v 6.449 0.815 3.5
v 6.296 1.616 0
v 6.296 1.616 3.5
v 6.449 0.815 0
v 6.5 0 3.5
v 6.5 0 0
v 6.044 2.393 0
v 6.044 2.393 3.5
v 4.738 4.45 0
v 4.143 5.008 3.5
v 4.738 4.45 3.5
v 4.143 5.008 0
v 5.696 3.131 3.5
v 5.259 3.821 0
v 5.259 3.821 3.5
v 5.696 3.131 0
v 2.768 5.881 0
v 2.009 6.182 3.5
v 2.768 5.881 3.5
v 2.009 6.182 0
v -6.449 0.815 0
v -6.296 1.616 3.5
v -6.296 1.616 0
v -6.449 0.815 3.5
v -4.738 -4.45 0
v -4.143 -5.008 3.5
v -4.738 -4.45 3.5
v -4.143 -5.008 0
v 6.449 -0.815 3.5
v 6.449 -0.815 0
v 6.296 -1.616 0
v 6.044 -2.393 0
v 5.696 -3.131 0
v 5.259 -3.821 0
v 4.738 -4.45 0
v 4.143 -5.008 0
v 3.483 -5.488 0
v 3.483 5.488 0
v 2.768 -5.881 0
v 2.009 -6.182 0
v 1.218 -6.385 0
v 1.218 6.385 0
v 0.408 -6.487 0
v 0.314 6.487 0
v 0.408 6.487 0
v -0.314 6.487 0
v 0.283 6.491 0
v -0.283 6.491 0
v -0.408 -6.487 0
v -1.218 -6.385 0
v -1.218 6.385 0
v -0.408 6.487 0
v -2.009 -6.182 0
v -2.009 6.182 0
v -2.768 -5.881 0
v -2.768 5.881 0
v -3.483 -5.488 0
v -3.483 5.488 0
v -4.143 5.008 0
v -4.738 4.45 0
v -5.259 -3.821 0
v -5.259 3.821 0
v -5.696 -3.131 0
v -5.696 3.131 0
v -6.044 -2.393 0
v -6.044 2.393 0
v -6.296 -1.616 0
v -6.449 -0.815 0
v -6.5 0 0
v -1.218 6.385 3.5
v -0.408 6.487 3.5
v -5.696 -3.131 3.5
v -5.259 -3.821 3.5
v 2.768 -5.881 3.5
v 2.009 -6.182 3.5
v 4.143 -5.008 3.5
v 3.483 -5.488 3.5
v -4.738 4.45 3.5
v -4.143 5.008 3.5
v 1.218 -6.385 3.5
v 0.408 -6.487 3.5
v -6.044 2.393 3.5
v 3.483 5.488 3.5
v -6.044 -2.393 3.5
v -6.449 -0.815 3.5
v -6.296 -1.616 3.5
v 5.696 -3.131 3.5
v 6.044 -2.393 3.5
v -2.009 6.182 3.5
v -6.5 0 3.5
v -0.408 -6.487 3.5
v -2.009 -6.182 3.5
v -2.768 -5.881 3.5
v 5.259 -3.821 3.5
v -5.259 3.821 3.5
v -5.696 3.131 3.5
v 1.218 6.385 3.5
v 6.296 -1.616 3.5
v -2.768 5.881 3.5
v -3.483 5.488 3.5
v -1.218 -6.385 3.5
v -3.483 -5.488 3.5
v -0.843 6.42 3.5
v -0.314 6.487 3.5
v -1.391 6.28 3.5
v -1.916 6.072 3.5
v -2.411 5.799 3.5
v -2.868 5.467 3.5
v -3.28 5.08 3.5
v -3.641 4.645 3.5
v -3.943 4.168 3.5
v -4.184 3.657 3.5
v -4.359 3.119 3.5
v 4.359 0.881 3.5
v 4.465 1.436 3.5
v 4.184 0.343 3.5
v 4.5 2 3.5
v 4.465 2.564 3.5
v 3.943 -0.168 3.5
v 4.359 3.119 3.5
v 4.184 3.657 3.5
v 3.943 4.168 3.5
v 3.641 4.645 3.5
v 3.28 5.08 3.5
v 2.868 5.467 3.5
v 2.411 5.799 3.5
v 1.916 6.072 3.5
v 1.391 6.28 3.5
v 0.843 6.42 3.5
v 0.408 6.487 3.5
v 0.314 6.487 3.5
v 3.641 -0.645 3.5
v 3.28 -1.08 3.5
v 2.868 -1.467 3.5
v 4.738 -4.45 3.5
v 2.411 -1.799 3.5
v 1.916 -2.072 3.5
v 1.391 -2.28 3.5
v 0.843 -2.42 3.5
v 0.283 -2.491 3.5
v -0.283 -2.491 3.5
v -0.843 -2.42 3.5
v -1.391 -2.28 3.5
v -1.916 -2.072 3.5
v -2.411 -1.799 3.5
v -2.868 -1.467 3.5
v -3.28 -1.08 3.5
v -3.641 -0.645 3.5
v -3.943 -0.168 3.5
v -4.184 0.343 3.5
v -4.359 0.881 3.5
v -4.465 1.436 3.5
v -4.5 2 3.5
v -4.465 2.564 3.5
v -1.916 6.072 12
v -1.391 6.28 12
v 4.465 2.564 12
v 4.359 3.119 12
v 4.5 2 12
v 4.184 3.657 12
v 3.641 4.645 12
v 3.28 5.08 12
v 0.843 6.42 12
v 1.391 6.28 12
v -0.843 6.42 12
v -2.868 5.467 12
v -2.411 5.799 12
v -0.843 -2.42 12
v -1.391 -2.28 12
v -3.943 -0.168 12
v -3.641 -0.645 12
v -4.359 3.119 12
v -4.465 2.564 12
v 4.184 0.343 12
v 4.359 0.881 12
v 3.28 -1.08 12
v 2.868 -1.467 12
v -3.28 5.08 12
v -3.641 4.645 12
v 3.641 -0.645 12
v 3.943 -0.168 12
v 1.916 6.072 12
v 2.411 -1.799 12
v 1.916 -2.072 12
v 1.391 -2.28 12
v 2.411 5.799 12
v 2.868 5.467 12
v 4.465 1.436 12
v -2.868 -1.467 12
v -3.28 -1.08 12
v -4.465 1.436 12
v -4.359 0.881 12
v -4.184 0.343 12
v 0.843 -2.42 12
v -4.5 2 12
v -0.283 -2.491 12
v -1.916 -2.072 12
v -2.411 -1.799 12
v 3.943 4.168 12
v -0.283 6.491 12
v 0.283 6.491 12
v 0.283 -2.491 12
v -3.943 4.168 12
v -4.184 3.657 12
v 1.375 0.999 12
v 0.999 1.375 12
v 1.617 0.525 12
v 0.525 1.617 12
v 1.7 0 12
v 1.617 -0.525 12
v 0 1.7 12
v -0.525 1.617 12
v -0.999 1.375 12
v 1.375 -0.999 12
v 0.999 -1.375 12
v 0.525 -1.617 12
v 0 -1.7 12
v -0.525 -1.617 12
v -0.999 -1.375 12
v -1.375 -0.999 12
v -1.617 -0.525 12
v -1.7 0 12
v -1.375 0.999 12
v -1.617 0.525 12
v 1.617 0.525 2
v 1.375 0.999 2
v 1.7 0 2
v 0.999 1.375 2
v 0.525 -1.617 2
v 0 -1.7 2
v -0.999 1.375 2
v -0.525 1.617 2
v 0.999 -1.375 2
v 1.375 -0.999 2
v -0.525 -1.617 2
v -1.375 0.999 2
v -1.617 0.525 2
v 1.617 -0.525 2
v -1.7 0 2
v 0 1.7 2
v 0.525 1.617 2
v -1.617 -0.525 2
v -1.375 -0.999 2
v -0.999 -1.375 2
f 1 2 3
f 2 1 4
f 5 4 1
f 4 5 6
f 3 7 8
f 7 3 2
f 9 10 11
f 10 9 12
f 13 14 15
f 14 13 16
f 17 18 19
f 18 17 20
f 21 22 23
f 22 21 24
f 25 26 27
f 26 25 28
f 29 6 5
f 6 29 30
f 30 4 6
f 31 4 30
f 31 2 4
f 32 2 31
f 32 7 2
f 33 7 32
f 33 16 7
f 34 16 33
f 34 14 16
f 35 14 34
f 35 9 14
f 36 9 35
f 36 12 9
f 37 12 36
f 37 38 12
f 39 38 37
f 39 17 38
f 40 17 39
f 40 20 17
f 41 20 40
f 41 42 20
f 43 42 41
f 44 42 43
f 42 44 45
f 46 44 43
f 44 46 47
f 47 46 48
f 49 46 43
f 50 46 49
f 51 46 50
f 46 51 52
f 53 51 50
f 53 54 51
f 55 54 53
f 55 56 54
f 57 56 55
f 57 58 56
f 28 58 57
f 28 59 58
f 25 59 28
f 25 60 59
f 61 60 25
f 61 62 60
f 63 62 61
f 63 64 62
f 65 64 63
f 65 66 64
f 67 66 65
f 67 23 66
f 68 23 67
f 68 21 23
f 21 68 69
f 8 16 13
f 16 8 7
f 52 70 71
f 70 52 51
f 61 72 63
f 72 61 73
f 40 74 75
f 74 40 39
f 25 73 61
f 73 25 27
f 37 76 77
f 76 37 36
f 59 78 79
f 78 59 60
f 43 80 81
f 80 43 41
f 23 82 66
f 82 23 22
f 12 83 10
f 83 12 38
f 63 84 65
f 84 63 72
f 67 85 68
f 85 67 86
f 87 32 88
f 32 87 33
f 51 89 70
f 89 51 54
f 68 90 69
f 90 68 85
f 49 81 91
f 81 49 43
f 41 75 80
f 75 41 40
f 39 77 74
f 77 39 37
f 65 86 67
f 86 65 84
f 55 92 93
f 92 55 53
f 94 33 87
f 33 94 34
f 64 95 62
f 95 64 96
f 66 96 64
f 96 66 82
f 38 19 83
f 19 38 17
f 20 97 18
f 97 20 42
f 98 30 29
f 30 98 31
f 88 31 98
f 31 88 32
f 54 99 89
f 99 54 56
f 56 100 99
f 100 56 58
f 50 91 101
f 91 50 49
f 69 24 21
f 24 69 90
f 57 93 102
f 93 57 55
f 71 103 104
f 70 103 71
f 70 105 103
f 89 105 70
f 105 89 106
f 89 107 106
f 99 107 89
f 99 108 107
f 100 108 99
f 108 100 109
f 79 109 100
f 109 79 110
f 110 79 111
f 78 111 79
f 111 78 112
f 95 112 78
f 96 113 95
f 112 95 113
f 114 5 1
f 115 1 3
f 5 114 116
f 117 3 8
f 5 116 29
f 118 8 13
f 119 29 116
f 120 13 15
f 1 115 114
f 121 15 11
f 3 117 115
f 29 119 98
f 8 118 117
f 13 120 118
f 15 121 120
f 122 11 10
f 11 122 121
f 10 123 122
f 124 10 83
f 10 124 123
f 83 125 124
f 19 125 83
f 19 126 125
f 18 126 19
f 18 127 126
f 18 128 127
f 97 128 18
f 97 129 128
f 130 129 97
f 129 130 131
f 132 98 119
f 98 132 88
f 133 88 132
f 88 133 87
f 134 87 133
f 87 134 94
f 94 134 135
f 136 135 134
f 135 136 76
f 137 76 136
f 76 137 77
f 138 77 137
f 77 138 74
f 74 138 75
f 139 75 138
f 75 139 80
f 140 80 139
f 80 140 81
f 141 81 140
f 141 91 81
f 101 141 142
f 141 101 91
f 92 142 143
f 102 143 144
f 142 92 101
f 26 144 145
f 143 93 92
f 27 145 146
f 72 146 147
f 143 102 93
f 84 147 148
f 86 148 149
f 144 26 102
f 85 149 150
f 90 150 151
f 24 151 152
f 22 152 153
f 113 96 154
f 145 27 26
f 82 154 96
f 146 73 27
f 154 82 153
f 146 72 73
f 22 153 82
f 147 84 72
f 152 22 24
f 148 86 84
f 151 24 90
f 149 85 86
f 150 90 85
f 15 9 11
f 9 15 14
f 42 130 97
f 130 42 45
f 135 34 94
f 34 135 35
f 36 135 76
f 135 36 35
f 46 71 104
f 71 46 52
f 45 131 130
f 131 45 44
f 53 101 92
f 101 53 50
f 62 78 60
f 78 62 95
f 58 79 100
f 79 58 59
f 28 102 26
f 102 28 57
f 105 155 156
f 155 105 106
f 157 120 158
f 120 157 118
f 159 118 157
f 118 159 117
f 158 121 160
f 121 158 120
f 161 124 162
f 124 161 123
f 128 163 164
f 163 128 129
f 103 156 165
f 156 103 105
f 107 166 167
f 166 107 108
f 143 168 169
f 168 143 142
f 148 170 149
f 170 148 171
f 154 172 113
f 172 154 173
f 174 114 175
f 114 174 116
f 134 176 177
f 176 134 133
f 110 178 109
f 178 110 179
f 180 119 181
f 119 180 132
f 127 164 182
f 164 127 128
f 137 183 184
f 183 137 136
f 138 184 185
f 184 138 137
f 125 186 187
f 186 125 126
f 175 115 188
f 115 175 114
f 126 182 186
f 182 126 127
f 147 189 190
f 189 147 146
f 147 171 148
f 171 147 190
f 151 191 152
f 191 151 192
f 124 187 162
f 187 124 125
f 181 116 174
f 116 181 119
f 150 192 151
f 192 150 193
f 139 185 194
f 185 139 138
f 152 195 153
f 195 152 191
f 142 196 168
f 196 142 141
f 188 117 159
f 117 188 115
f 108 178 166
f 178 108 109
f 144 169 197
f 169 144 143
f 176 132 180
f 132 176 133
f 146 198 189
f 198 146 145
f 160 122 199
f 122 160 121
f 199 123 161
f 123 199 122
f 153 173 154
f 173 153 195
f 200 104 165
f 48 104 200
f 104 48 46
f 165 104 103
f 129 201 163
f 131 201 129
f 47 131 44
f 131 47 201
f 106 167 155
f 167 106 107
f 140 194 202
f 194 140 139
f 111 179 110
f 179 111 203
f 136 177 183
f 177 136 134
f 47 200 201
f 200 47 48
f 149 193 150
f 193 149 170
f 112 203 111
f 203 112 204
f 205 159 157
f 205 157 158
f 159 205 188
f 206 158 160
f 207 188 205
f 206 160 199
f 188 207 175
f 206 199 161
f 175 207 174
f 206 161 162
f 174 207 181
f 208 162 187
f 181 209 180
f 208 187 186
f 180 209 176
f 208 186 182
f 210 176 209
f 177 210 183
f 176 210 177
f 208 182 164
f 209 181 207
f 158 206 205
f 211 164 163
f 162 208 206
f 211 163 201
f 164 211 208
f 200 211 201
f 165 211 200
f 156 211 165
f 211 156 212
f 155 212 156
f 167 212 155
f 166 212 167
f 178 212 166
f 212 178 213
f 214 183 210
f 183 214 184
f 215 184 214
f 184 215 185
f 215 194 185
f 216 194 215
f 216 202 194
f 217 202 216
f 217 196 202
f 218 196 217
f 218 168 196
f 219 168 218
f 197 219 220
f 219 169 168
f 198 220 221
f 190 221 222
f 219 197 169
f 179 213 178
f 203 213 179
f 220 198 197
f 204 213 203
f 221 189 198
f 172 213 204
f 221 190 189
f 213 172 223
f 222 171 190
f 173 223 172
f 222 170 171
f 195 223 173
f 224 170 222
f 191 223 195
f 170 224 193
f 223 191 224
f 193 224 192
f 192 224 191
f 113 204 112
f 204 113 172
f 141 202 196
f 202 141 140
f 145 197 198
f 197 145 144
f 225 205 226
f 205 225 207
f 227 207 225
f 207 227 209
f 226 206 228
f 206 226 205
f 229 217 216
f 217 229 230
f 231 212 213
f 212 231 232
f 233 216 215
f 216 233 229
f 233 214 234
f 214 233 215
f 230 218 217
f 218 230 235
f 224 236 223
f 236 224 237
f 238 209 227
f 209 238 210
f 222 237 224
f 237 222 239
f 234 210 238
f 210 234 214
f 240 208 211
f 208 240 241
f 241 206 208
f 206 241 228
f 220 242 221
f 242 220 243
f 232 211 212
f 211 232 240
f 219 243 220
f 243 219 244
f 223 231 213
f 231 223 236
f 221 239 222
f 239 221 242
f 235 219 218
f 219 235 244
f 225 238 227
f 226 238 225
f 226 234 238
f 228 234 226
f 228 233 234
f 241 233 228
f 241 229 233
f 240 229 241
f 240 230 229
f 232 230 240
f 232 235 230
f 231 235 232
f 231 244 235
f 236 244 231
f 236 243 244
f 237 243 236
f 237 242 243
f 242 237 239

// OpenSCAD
difference()
{
union()
{
scale([1,1,1]) cylinder(3.5,6.5,6.5,$fn=50);
translate([0,2,0]) cylinder(12,4.5,4.5,$fn=50);
}

translate([0,0,2]) cylinder(12,1.7,1.7,$fn=20);
}
